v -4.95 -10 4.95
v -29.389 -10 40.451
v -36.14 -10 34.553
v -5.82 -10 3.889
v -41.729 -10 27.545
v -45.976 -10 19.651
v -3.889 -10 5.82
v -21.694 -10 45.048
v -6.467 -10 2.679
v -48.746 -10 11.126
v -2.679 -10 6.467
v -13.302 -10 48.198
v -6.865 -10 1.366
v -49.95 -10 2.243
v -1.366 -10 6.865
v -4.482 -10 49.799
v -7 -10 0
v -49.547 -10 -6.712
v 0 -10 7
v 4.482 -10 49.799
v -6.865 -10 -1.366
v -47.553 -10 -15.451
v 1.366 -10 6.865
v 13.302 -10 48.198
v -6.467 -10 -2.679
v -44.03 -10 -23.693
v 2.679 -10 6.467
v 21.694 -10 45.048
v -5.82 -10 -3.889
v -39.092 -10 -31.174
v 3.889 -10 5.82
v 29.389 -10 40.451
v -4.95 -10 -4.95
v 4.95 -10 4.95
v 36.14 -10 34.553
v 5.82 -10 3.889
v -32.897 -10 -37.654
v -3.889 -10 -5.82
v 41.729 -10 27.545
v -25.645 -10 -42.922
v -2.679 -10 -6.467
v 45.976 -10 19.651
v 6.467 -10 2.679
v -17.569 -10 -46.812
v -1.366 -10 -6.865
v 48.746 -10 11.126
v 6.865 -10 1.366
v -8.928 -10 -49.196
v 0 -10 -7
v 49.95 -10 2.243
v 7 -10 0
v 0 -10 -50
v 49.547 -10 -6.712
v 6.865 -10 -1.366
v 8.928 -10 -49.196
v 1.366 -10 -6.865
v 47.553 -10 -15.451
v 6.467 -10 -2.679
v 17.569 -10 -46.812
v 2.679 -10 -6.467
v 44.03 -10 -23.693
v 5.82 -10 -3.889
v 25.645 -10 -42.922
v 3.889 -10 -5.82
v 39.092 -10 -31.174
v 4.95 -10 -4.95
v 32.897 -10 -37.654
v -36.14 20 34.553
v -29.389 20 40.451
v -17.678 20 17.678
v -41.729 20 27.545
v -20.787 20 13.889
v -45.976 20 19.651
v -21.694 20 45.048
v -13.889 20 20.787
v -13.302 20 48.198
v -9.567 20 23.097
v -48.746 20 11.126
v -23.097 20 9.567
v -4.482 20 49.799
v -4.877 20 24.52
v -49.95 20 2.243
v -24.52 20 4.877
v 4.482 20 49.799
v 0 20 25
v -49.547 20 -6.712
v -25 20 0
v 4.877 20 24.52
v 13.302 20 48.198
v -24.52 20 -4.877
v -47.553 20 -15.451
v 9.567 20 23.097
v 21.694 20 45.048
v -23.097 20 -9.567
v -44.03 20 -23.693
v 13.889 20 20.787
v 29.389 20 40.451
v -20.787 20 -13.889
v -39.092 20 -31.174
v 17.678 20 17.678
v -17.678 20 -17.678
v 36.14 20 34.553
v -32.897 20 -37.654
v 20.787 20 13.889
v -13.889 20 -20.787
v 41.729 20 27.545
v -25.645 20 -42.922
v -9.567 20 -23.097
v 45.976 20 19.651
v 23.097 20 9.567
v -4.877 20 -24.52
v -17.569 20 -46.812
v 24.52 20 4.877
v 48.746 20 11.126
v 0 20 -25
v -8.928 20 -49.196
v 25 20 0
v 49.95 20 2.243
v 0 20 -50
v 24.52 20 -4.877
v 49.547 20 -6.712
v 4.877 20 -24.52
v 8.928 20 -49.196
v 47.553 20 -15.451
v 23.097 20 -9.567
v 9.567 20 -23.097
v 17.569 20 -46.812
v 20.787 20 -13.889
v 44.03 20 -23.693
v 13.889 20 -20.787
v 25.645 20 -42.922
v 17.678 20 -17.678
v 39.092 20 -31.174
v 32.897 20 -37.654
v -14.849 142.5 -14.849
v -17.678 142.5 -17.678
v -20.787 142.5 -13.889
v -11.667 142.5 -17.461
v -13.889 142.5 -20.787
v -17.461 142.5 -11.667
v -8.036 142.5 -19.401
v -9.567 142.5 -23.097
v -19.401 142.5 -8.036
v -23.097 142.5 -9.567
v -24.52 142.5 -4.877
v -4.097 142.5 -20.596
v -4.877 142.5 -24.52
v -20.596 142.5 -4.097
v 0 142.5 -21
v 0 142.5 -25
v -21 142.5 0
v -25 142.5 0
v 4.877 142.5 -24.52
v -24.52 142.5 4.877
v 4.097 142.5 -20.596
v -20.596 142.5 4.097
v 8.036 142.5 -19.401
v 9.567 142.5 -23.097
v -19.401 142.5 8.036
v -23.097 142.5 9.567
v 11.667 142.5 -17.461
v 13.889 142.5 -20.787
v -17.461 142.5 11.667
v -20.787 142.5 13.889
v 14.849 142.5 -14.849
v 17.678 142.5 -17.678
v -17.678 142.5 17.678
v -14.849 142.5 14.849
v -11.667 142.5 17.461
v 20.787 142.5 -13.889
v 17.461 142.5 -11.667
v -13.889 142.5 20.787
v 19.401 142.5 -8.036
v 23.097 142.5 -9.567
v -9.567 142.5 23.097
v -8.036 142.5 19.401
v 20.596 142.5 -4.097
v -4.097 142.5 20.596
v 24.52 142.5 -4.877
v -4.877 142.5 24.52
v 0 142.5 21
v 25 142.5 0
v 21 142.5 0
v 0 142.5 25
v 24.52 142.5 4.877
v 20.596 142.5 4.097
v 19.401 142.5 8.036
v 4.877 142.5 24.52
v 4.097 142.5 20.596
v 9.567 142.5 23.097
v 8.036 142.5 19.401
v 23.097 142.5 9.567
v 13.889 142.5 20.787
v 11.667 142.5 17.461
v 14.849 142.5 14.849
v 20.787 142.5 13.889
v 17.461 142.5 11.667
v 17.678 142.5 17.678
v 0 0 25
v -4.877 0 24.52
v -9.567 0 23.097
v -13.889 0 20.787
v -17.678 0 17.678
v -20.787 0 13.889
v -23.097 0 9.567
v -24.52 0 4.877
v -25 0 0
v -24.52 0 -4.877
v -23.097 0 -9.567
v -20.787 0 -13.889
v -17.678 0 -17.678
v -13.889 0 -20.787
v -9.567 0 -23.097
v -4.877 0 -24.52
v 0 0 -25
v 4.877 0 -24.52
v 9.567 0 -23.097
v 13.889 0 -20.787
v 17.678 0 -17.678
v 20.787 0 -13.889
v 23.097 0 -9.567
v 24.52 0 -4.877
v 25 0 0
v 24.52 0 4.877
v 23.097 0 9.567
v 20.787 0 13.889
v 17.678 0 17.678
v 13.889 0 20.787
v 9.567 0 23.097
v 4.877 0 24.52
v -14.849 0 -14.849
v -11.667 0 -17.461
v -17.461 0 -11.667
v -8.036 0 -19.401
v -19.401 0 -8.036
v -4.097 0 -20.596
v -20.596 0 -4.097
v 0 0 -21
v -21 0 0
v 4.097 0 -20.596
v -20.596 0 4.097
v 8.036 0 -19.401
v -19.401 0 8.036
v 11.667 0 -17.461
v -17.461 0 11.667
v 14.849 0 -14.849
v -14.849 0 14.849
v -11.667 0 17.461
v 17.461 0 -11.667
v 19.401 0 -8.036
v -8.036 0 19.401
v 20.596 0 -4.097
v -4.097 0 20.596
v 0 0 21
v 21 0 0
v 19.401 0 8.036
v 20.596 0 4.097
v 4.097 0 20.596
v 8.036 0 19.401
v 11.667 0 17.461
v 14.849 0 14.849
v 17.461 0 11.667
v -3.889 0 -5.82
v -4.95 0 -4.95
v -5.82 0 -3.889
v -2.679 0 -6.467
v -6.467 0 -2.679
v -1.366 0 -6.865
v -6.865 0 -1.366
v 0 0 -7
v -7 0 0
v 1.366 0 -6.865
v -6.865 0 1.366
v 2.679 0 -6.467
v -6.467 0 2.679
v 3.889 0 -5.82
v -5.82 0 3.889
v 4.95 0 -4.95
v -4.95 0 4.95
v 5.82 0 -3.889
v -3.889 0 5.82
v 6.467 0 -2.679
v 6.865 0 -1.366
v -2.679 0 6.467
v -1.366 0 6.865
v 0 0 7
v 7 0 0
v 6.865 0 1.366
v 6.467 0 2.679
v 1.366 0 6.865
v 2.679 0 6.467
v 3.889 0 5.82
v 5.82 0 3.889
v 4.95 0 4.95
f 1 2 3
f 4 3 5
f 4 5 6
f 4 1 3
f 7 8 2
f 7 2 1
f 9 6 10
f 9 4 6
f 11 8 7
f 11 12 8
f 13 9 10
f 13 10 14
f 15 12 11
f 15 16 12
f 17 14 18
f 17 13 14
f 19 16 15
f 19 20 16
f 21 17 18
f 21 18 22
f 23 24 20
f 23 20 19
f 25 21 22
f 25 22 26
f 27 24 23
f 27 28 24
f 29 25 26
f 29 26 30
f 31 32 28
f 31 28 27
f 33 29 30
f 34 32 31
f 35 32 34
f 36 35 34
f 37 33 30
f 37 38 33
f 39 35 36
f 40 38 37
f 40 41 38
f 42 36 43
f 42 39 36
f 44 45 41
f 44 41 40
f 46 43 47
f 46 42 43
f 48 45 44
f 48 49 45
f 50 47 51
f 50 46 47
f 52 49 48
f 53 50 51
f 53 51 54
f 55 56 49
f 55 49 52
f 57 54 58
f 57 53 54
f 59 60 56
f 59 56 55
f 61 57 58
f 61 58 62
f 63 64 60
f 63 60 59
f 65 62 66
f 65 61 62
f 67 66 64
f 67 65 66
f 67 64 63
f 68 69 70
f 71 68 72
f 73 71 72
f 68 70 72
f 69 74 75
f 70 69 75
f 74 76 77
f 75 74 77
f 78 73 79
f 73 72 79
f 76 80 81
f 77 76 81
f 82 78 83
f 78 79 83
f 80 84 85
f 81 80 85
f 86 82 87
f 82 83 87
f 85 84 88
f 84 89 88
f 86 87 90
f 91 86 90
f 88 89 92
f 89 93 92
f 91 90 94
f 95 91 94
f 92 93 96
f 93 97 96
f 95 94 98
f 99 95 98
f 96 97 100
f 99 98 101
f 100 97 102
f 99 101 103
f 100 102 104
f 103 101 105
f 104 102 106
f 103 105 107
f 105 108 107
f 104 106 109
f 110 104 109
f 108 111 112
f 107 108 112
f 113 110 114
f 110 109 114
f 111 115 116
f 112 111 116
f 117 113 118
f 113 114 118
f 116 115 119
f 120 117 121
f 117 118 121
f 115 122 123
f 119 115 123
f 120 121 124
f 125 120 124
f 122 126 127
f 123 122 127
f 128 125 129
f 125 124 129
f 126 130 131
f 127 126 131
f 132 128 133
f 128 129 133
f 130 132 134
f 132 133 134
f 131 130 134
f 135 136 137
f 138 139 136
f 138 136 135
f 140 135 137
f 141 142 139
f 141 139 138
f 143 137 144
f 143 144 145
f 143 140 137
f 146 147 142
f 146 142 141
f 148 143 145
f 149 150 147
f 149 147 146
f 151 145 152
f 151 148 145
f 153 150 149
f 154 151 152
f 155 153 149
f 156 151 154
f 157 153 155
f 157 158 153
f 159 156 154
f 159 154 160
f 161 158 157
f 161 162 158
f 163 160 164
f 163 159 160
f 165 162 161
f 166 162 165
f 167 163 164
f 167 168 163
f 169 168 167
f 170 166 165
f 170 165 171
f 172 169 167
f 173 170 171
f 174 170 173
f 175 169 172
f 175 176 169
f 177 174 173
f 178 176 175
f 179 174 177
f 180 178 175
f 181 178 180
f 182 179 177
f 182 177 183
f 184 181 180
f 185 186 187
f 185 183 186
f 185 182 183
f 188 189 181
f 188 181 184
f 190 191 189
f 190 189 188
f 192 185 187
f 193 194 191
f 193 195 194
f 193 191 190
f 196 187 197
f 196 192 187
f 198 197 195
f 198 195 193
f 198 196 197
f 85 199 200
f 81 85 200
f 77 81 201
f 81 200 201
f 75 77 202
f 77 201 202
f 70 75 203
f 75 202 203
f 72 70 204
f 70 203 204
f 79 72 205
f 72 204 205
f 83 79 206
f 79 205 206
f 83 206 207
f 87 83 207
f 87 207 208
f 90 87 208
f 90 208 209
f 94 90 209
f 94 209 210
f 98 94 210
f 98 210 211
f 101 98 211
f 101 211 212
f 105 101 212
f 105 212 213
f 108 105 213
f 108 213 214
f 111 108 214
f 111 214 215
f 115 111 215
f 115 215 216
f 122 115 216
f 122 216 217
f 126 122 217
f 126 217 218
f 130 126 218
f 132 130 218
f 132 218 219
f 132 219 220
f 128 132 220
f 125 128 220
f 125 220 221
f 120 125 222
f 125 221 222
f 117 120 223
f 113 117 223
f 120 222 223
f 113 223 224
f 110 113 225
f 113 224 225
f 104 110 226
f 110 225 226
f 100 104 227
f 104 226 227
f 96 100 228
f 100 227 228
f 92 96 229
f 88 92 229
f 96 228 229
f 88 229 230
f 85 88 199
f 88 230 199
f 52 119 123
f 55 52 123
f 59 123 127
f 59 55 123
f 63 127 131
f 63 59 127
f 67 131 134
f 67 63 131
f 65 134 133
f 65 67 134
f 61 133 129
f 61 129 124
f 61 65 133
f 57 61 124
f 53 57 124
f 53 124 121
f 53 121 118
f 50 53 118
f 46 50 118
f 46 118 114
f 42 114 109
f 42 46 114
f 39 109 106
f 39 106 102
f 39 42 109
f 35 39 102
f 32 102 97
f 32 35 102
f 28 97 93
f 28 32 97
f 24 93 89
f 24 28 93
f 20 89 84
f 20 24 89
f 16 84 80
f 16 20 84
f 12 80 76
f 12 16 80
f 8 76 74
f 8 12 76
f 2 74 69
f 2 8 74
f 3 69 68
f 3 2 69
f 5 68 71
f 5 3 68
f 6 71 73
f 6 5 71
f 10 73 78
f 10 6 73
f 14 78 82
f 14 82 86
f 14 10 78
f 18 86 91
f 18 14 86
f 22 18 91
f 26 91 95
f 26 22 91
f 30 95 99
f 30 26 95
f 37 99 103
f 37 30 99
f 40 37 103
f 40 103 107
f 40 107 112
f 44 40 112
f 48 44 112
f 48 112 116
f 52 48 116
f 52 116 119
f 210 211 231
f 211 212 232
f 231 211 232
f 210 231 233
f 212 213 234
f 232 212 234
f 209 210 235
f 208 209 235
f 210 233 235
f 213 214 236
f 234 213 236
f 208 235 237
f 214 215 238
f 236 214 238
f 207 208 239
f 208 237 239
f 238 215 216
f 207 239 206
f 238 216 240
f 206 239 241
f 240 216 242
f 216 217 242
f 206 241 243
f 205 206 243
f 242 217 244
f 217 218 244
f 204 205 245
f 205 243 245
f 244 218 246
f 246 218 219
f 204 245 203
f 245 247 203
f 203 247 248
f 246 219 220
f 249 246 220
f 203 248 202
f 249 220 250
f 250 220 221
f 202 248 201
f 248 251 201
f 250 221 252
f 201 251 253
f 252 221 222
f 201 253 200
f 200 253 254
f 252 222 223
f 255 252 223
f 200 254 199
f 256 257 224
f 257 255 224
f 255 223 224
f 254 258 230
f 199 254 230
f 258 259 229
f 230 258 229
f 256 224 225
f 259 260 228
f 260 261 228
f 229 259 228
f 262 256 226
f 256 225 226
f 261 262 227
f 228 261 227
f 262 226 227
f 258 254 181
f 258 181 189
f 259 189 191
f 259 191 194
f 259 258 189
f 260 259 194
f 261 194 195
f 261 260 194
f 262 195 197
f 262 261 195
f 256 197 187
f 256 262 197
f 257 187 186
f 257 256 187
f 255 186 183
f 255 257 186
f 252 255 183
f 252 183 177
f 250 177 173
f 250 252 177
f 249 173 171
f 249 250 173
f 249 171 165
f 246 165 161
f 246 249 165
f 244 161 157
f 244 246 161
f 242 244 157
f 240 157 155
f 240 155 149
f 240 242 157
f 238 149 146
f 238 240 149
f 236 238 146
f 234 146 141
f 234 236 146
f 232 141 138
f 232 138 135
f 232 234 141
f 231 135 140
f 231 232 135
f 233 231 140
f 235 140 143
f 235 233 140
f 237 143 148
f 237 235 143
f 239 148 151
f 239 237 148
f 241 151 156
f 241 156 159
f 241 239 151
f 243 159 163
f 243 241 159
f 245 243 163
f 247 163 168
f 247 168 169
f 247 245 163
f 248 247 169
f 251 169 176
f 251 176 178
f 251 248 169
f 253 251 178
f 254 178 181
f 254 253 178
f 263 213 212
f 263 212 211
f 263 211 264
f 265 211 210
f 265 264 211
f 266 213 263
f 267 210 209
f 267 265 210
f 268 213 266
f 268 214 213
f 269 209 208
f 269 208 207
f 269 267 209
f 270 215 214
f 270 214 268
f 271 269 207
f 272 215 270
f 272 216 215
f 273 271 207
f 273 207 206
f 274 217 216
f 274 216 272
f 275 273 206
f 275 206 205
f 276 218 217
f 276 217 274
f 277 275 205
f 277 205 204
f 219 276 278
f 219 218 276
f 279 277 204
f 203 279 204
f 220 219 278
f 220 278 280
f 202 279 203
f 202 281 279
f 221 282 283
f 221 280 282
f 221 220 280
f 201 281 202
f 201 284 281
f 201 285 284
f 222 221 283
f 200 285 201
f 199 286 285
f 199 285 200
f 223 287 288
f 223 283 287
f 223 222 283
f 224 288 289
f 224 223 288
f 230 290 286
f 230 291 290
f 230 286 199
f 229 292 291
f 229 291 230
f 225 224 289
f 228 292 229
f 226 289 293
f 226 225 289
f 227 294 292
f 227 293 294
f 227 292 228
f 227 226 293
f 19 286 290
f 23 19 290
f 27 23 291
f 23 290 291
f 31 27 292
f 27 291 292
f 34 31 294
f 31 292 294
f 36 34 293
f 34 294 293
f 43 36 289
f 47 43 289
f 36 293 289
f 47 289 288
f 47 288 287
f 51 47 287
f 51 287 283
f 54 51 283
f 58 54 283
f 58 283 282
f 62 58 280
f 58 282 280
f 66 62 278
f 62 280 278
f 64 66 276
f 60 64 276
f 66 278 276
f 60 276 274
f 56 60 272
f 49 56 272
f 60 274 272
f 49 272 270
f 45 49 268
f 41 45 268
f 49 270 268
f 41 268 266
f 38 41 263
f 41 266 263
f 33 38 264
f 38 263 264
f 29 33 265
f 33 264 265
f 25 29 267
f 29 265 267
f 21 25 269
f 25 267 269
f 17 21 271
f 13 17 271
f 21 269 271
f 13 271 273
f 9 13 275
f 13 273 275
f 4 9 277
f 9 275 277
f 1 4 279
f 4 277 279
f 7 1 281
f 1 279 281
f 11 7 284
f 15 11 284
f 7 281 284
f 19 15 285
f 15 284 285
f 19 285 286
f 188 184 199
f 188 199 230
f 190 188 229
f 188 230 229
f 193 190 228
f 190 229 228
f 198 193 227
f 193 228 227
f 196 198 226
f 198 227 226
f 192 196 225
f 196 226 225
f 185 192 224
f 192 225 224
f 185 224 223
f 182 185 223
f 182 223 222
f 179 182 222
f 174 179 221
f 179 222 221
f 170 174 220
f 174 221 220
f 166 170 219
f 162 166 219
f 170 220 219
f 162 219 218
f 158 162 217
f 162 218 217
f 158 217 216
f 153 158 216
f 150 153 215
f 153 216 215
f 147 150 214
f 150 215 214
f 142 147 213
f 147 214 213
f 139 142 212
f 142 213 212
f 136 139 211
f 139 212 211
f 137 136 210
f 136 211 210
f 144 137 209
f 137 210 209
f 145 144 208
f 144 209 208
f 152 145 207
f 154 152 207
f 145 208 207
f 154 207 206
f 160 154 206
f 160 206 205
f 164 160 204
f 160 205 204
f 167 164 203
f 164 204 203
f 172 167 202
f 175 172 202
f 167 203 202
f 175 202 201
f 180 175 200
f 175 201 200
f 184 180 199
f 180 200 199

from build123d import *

# Parameters (mm, degrees)
ESBO_O1_R                = 25
ESBO_O1_R_2              = 21
RESSALTO_EXTRUS_O1_DEPTH = 142.5
ESBO_O1_4_R              = 25
ESBO_O1_4_R_2            = 7
RESSALTO_EXTRUS_O2_DEPTH = 10
ESBO_O2_R                = 50
ESBO_O2_R_2              = 25
RESSALTO_EXTRUS_O3_DEPTH = 30


with BuildPart() as part:
    # Esboço1 → Ressalto-extrusão1 (new body)
    with BuildSketch(Plane(origin=(0, 0, 0), x_dir=(1, 0, 0), z_dir=(0, 1, 0))):
        Circle(ESBO_O1_R)
        Circle(ESBO_O1_R_2, mode=Mode.SUBTRACT)
    extrude(amount=RESSALTO_EXTRUS_O1_DEPTH)


with BuildPart() as body_2:
    # Esboço1<4> → Ressalto-extrusão2 (new body)
    with BuildSketch(Plane(origin=(0, 0, 0), x_dir=(1, 0, 0), z_dir=(0, 1, 0))):
        Circle(ESBO_O1_4_R)
        Circle(ESBO_O1_4_R_2, mode=Mode.SUBTRACT)
    extrude(amount=-RESSALTO_EXTRUS_O2_DEPTH)


with BuildPart() as body_3:
    # Esboço2 → Ressalto-extrusão3 (new body)
    with BuildSketch(Plane.XZ.offset(10)):
        Circle(ESBO_O2_R)
        Circle(ESBO_O2_R_2, mode=Mode.SUBTRACT)
    extrude(amount=-RESSALTO_EXTRUS_O3_DEPTH)


with BuildPart() as body_2_1:
    add(body_2.part)

    # Combinar1: union body 3
    add(body_3.part)


solid = Compound([part.part, body_2_1.part])
